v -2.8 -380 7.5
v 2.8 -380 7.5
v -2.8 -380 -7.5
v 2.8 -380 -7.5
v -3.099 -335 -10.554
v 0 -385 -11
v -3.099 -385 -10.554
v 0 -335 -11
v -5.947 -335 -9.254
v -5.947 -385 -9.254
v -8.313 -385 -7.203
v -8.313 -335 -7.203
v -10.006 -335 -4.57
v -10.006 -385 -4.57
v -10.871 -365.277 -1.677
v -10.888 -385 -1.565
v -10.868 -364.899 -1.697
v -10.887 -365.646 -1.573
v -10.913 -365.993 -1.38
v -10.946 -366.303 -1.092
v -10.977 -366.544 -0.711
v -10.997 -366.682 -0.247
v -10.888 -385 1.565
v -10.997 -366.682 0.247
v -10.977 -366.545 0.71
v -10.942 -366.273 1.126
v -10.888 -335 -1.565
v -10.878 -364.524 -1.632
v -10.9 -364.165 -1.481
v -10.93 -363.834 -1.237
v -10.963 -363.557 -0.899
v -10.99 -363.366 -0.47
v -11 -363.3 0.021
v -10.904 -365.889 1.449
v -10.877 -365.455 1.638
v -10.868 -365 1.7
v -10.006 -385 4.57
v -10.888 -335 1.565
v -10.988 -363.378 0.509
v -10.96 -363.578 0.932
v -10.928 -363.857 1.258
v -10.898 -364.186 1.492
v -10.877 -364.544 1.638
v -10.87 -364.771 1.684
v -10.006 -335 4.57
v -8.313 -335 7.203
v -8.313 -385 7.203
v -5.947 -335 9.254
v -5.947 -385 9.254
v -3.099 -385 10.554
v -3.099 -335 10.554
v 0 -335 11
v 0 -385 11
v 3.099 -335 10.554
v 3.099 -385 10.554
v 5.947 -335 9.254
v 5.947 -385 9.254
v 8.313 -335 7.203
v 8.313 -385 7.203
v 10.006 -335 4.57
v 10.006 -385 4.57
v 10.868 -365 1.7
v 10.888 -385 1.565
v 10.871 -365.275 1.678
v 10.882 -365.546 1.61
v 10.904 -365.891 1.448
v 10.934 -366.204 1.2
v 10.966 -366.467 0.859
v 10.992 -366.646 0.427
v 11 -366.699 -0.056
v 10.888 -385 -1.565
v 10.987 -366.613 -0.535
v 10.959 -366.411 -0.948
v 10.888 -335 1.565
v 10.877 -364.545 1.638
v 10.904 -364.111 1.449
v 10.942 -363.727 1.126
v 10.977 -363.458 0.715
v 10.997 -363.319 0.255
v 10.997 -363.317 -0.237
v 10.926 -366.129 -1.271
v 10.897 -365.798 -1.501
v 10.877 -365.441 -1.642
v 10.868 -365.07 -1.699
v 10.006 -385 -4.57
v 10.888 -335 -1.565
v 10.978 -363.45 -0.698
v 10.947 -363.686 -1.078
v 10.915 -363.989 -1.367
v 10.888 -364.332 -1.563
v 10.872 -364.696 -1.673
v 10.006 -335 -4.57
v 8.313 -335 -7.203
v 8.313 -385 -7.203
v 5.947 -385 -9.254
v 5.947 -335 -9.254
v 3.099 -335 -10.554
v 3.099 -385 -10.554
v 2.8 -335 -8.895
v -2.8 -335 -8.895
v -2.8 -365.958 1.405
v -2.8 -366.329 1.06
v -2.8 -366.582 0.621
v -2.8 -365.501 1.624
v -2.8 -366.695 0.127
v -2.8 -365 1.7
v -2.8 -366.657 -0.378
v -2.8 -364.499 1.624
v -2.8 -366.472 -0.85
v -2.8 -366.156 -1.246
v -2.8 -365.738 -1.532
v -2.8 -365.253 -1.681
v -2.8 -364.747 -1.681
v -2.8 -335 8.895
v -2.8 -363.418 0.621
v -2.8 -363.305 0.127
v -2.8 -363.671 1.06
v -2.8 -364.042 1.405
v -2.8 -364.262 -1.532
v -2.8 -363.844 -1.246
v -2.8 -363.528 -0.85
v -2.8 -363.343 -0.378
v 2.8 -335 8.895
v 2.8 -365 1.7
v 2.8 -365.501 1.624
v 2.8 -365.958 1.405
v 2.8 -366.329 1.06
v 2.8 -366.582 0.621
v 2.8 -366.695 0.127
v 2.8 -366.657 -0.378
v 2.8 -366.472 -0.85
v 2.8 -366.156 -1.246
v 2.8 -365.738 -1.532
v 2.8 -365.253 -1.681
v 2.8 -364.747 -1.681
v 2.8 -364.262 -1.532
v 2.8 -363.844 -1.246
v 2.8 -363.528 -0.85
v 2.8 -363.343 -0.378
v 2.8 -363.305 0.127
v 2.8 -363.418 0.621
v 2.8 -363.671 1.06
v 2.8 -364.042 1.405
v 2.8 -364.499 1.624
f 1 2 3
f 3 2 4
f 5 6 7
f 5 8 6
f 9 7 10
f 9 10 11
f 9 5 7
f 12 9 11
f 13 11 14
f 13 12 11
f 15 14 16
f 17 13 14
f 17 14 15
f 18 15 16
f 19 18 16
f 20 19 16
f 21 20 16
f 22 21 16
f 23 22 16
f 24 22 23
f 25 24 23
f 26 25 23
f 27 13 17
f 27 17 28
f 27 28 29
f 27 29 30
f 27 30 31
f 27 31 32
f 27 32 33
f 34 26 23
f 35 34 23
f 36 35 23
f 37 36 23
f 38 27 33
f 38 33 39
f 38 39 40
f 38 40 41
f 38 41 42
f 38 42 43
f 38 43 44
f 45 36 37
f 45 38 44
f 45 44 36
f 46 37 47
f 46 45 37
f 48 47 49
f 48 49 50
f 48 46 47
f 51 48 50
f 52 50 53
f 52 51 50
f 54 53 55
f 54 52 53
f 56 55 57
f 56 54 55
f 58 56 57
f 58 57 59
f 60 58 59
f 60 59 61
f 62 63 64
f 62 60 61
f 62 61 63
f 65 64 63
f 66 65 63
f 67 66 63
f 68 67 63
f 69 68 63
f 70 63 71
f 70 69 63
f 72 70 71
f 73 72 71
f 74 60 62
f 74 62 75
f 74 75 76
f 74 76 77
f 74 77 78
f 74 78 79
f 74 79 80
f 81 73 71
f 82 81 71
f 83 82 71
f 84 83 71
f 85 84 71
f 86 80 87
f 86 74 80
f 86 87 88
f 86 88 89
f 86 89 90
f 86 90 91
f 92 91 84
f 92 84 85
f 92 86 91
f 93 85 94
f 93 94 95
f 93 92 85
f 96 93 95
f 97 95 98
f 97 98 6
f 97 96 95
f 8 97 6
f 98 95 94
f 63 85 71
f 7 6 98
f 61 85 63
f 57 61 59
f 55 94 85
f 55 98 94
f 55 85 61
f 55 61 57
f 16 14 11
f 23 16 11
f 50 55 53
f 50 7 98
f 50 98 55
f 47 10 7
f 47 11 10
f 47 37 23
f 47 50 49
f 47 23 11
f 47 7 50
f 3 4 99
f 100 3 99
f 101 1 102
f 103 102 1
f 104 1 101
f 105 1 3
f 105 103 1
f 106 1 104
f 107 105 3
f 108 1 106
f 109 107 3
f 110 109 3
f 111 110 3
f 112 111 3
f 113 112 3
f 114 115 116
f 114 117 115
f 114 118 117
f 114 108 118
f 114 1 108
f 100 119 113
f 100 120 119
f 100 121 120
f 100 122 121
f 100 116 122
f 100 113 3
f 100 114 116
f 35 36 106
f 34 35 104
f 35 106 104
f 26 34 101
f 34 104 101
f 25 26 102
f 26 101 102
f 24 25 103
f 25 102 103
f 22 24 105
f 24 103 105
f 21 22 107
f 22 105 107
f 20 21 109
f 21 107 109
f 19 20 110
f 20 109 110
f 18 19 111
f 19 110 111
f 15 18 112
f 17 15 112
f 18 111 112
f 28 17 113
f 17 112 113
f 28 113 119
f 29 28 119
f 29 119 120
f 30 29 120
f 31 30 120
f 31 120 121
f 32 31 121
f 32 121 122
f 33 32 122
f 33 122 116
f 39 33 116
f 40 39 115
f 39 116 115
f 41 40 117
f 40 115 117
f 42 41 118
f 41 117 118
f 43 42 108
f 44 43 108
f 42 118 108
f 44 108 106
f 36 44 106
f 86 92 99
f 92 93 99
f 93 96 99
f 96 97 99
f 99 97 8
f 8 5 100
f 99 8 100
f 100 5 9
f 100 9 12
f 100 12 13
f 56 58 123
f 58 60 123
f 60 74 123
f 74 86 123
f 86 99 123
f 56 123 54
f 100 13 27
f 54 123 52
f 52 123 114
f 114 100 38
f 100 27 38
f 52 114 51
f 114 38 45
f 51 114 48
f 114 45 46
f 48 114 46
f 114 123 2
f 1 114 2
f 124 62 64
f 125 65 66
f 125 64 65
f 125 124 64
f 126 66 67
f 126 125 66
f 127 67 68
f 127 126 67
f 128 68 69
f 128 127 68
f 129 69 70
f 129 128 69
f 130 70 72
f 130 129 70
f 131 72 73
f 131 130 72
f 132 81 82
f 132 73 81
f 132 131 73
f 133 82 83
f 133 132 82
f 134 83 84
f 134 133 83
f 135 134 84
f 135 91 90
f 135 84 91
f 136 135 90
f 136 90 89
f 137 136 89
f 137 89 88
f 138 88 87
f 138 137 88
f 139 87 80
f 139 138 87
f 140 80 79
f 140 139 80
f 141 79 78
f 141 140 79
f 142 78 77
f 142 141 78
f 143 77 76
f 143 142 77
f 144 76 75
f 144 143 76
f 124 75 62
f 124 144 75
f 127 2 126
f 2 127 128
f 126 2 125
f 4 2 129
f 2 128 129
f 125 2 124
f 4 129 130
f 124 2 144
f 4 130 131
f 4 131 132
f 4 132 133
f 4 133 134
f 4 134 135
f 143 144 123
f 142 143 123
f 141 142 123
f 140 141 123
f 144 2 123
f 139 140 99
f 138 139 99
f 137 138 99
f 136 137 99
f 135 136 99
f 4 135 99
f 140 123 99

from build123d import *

# Parameters (mm, degrees)
SKETCH2_W          = 11
SKETCH2_H          = 50
CUT_EXTRUDE1_DEPTH = 2.8


with BuildPart() as part:
    # Sketch2 → Revolve1 (revolve)
    with BuildSketch(Plane(origin=(0, 0, 0), x_dir=(0, 0, -1), z_dir=(1, 0, 0))):
        with Locations((5.5, -360)):
            Rectangle(SKETCH2_W, SKETCH2_H)
    revolve(axis=Axis((0, -385, 0), (0, 1, 0)))

    # Sketch1 → Cut-Extrude1 (cut, symmetric)
    with BuildSketch(Plane(origin=(0, 0, 0), x_dir=(0, 0, -1), z_dir=(1, 0, 0))):
        Polygon((-38.186717683, 609.980512405), (-17.5, -57.391201416), (-7.5, -380), (7.5, -380), (17.5, -57.391201416), (38.186717683, 609.980512405), (38.186717683, 1945.365018378), (-38.186717683, 1945.365018378), align=None)
    extrude(amount=CUT_EXTRUDE1_DEPTH, both=True, mode=Mode.SUBTRACT)

    # Sketch4 → M3 Clearance Hole1 (revolve, cut)
    with BuildSketch(Plane.ZX.offset(-365)):
        Polygon((0, 0), (0, 11), (1.7, 11), (1.7, 0.020977491), (1.725, 0), align=None)
    m3_clearance_hole1 = revolve(axis=Axis((-6.35, -365, 0), (1, 0, 0)), mode=Mode.SUBTRACT)

    # Mirror1: M3 Clearance Hole1 across plane
    add(m3_clearance_hole1.mirror(Plane(origin=(0, 0, 0), x_dir=(0, 0, 1), z_dir=(1, 0, 0))), mode=Mode.SUBTRACT)


solid = part.part
